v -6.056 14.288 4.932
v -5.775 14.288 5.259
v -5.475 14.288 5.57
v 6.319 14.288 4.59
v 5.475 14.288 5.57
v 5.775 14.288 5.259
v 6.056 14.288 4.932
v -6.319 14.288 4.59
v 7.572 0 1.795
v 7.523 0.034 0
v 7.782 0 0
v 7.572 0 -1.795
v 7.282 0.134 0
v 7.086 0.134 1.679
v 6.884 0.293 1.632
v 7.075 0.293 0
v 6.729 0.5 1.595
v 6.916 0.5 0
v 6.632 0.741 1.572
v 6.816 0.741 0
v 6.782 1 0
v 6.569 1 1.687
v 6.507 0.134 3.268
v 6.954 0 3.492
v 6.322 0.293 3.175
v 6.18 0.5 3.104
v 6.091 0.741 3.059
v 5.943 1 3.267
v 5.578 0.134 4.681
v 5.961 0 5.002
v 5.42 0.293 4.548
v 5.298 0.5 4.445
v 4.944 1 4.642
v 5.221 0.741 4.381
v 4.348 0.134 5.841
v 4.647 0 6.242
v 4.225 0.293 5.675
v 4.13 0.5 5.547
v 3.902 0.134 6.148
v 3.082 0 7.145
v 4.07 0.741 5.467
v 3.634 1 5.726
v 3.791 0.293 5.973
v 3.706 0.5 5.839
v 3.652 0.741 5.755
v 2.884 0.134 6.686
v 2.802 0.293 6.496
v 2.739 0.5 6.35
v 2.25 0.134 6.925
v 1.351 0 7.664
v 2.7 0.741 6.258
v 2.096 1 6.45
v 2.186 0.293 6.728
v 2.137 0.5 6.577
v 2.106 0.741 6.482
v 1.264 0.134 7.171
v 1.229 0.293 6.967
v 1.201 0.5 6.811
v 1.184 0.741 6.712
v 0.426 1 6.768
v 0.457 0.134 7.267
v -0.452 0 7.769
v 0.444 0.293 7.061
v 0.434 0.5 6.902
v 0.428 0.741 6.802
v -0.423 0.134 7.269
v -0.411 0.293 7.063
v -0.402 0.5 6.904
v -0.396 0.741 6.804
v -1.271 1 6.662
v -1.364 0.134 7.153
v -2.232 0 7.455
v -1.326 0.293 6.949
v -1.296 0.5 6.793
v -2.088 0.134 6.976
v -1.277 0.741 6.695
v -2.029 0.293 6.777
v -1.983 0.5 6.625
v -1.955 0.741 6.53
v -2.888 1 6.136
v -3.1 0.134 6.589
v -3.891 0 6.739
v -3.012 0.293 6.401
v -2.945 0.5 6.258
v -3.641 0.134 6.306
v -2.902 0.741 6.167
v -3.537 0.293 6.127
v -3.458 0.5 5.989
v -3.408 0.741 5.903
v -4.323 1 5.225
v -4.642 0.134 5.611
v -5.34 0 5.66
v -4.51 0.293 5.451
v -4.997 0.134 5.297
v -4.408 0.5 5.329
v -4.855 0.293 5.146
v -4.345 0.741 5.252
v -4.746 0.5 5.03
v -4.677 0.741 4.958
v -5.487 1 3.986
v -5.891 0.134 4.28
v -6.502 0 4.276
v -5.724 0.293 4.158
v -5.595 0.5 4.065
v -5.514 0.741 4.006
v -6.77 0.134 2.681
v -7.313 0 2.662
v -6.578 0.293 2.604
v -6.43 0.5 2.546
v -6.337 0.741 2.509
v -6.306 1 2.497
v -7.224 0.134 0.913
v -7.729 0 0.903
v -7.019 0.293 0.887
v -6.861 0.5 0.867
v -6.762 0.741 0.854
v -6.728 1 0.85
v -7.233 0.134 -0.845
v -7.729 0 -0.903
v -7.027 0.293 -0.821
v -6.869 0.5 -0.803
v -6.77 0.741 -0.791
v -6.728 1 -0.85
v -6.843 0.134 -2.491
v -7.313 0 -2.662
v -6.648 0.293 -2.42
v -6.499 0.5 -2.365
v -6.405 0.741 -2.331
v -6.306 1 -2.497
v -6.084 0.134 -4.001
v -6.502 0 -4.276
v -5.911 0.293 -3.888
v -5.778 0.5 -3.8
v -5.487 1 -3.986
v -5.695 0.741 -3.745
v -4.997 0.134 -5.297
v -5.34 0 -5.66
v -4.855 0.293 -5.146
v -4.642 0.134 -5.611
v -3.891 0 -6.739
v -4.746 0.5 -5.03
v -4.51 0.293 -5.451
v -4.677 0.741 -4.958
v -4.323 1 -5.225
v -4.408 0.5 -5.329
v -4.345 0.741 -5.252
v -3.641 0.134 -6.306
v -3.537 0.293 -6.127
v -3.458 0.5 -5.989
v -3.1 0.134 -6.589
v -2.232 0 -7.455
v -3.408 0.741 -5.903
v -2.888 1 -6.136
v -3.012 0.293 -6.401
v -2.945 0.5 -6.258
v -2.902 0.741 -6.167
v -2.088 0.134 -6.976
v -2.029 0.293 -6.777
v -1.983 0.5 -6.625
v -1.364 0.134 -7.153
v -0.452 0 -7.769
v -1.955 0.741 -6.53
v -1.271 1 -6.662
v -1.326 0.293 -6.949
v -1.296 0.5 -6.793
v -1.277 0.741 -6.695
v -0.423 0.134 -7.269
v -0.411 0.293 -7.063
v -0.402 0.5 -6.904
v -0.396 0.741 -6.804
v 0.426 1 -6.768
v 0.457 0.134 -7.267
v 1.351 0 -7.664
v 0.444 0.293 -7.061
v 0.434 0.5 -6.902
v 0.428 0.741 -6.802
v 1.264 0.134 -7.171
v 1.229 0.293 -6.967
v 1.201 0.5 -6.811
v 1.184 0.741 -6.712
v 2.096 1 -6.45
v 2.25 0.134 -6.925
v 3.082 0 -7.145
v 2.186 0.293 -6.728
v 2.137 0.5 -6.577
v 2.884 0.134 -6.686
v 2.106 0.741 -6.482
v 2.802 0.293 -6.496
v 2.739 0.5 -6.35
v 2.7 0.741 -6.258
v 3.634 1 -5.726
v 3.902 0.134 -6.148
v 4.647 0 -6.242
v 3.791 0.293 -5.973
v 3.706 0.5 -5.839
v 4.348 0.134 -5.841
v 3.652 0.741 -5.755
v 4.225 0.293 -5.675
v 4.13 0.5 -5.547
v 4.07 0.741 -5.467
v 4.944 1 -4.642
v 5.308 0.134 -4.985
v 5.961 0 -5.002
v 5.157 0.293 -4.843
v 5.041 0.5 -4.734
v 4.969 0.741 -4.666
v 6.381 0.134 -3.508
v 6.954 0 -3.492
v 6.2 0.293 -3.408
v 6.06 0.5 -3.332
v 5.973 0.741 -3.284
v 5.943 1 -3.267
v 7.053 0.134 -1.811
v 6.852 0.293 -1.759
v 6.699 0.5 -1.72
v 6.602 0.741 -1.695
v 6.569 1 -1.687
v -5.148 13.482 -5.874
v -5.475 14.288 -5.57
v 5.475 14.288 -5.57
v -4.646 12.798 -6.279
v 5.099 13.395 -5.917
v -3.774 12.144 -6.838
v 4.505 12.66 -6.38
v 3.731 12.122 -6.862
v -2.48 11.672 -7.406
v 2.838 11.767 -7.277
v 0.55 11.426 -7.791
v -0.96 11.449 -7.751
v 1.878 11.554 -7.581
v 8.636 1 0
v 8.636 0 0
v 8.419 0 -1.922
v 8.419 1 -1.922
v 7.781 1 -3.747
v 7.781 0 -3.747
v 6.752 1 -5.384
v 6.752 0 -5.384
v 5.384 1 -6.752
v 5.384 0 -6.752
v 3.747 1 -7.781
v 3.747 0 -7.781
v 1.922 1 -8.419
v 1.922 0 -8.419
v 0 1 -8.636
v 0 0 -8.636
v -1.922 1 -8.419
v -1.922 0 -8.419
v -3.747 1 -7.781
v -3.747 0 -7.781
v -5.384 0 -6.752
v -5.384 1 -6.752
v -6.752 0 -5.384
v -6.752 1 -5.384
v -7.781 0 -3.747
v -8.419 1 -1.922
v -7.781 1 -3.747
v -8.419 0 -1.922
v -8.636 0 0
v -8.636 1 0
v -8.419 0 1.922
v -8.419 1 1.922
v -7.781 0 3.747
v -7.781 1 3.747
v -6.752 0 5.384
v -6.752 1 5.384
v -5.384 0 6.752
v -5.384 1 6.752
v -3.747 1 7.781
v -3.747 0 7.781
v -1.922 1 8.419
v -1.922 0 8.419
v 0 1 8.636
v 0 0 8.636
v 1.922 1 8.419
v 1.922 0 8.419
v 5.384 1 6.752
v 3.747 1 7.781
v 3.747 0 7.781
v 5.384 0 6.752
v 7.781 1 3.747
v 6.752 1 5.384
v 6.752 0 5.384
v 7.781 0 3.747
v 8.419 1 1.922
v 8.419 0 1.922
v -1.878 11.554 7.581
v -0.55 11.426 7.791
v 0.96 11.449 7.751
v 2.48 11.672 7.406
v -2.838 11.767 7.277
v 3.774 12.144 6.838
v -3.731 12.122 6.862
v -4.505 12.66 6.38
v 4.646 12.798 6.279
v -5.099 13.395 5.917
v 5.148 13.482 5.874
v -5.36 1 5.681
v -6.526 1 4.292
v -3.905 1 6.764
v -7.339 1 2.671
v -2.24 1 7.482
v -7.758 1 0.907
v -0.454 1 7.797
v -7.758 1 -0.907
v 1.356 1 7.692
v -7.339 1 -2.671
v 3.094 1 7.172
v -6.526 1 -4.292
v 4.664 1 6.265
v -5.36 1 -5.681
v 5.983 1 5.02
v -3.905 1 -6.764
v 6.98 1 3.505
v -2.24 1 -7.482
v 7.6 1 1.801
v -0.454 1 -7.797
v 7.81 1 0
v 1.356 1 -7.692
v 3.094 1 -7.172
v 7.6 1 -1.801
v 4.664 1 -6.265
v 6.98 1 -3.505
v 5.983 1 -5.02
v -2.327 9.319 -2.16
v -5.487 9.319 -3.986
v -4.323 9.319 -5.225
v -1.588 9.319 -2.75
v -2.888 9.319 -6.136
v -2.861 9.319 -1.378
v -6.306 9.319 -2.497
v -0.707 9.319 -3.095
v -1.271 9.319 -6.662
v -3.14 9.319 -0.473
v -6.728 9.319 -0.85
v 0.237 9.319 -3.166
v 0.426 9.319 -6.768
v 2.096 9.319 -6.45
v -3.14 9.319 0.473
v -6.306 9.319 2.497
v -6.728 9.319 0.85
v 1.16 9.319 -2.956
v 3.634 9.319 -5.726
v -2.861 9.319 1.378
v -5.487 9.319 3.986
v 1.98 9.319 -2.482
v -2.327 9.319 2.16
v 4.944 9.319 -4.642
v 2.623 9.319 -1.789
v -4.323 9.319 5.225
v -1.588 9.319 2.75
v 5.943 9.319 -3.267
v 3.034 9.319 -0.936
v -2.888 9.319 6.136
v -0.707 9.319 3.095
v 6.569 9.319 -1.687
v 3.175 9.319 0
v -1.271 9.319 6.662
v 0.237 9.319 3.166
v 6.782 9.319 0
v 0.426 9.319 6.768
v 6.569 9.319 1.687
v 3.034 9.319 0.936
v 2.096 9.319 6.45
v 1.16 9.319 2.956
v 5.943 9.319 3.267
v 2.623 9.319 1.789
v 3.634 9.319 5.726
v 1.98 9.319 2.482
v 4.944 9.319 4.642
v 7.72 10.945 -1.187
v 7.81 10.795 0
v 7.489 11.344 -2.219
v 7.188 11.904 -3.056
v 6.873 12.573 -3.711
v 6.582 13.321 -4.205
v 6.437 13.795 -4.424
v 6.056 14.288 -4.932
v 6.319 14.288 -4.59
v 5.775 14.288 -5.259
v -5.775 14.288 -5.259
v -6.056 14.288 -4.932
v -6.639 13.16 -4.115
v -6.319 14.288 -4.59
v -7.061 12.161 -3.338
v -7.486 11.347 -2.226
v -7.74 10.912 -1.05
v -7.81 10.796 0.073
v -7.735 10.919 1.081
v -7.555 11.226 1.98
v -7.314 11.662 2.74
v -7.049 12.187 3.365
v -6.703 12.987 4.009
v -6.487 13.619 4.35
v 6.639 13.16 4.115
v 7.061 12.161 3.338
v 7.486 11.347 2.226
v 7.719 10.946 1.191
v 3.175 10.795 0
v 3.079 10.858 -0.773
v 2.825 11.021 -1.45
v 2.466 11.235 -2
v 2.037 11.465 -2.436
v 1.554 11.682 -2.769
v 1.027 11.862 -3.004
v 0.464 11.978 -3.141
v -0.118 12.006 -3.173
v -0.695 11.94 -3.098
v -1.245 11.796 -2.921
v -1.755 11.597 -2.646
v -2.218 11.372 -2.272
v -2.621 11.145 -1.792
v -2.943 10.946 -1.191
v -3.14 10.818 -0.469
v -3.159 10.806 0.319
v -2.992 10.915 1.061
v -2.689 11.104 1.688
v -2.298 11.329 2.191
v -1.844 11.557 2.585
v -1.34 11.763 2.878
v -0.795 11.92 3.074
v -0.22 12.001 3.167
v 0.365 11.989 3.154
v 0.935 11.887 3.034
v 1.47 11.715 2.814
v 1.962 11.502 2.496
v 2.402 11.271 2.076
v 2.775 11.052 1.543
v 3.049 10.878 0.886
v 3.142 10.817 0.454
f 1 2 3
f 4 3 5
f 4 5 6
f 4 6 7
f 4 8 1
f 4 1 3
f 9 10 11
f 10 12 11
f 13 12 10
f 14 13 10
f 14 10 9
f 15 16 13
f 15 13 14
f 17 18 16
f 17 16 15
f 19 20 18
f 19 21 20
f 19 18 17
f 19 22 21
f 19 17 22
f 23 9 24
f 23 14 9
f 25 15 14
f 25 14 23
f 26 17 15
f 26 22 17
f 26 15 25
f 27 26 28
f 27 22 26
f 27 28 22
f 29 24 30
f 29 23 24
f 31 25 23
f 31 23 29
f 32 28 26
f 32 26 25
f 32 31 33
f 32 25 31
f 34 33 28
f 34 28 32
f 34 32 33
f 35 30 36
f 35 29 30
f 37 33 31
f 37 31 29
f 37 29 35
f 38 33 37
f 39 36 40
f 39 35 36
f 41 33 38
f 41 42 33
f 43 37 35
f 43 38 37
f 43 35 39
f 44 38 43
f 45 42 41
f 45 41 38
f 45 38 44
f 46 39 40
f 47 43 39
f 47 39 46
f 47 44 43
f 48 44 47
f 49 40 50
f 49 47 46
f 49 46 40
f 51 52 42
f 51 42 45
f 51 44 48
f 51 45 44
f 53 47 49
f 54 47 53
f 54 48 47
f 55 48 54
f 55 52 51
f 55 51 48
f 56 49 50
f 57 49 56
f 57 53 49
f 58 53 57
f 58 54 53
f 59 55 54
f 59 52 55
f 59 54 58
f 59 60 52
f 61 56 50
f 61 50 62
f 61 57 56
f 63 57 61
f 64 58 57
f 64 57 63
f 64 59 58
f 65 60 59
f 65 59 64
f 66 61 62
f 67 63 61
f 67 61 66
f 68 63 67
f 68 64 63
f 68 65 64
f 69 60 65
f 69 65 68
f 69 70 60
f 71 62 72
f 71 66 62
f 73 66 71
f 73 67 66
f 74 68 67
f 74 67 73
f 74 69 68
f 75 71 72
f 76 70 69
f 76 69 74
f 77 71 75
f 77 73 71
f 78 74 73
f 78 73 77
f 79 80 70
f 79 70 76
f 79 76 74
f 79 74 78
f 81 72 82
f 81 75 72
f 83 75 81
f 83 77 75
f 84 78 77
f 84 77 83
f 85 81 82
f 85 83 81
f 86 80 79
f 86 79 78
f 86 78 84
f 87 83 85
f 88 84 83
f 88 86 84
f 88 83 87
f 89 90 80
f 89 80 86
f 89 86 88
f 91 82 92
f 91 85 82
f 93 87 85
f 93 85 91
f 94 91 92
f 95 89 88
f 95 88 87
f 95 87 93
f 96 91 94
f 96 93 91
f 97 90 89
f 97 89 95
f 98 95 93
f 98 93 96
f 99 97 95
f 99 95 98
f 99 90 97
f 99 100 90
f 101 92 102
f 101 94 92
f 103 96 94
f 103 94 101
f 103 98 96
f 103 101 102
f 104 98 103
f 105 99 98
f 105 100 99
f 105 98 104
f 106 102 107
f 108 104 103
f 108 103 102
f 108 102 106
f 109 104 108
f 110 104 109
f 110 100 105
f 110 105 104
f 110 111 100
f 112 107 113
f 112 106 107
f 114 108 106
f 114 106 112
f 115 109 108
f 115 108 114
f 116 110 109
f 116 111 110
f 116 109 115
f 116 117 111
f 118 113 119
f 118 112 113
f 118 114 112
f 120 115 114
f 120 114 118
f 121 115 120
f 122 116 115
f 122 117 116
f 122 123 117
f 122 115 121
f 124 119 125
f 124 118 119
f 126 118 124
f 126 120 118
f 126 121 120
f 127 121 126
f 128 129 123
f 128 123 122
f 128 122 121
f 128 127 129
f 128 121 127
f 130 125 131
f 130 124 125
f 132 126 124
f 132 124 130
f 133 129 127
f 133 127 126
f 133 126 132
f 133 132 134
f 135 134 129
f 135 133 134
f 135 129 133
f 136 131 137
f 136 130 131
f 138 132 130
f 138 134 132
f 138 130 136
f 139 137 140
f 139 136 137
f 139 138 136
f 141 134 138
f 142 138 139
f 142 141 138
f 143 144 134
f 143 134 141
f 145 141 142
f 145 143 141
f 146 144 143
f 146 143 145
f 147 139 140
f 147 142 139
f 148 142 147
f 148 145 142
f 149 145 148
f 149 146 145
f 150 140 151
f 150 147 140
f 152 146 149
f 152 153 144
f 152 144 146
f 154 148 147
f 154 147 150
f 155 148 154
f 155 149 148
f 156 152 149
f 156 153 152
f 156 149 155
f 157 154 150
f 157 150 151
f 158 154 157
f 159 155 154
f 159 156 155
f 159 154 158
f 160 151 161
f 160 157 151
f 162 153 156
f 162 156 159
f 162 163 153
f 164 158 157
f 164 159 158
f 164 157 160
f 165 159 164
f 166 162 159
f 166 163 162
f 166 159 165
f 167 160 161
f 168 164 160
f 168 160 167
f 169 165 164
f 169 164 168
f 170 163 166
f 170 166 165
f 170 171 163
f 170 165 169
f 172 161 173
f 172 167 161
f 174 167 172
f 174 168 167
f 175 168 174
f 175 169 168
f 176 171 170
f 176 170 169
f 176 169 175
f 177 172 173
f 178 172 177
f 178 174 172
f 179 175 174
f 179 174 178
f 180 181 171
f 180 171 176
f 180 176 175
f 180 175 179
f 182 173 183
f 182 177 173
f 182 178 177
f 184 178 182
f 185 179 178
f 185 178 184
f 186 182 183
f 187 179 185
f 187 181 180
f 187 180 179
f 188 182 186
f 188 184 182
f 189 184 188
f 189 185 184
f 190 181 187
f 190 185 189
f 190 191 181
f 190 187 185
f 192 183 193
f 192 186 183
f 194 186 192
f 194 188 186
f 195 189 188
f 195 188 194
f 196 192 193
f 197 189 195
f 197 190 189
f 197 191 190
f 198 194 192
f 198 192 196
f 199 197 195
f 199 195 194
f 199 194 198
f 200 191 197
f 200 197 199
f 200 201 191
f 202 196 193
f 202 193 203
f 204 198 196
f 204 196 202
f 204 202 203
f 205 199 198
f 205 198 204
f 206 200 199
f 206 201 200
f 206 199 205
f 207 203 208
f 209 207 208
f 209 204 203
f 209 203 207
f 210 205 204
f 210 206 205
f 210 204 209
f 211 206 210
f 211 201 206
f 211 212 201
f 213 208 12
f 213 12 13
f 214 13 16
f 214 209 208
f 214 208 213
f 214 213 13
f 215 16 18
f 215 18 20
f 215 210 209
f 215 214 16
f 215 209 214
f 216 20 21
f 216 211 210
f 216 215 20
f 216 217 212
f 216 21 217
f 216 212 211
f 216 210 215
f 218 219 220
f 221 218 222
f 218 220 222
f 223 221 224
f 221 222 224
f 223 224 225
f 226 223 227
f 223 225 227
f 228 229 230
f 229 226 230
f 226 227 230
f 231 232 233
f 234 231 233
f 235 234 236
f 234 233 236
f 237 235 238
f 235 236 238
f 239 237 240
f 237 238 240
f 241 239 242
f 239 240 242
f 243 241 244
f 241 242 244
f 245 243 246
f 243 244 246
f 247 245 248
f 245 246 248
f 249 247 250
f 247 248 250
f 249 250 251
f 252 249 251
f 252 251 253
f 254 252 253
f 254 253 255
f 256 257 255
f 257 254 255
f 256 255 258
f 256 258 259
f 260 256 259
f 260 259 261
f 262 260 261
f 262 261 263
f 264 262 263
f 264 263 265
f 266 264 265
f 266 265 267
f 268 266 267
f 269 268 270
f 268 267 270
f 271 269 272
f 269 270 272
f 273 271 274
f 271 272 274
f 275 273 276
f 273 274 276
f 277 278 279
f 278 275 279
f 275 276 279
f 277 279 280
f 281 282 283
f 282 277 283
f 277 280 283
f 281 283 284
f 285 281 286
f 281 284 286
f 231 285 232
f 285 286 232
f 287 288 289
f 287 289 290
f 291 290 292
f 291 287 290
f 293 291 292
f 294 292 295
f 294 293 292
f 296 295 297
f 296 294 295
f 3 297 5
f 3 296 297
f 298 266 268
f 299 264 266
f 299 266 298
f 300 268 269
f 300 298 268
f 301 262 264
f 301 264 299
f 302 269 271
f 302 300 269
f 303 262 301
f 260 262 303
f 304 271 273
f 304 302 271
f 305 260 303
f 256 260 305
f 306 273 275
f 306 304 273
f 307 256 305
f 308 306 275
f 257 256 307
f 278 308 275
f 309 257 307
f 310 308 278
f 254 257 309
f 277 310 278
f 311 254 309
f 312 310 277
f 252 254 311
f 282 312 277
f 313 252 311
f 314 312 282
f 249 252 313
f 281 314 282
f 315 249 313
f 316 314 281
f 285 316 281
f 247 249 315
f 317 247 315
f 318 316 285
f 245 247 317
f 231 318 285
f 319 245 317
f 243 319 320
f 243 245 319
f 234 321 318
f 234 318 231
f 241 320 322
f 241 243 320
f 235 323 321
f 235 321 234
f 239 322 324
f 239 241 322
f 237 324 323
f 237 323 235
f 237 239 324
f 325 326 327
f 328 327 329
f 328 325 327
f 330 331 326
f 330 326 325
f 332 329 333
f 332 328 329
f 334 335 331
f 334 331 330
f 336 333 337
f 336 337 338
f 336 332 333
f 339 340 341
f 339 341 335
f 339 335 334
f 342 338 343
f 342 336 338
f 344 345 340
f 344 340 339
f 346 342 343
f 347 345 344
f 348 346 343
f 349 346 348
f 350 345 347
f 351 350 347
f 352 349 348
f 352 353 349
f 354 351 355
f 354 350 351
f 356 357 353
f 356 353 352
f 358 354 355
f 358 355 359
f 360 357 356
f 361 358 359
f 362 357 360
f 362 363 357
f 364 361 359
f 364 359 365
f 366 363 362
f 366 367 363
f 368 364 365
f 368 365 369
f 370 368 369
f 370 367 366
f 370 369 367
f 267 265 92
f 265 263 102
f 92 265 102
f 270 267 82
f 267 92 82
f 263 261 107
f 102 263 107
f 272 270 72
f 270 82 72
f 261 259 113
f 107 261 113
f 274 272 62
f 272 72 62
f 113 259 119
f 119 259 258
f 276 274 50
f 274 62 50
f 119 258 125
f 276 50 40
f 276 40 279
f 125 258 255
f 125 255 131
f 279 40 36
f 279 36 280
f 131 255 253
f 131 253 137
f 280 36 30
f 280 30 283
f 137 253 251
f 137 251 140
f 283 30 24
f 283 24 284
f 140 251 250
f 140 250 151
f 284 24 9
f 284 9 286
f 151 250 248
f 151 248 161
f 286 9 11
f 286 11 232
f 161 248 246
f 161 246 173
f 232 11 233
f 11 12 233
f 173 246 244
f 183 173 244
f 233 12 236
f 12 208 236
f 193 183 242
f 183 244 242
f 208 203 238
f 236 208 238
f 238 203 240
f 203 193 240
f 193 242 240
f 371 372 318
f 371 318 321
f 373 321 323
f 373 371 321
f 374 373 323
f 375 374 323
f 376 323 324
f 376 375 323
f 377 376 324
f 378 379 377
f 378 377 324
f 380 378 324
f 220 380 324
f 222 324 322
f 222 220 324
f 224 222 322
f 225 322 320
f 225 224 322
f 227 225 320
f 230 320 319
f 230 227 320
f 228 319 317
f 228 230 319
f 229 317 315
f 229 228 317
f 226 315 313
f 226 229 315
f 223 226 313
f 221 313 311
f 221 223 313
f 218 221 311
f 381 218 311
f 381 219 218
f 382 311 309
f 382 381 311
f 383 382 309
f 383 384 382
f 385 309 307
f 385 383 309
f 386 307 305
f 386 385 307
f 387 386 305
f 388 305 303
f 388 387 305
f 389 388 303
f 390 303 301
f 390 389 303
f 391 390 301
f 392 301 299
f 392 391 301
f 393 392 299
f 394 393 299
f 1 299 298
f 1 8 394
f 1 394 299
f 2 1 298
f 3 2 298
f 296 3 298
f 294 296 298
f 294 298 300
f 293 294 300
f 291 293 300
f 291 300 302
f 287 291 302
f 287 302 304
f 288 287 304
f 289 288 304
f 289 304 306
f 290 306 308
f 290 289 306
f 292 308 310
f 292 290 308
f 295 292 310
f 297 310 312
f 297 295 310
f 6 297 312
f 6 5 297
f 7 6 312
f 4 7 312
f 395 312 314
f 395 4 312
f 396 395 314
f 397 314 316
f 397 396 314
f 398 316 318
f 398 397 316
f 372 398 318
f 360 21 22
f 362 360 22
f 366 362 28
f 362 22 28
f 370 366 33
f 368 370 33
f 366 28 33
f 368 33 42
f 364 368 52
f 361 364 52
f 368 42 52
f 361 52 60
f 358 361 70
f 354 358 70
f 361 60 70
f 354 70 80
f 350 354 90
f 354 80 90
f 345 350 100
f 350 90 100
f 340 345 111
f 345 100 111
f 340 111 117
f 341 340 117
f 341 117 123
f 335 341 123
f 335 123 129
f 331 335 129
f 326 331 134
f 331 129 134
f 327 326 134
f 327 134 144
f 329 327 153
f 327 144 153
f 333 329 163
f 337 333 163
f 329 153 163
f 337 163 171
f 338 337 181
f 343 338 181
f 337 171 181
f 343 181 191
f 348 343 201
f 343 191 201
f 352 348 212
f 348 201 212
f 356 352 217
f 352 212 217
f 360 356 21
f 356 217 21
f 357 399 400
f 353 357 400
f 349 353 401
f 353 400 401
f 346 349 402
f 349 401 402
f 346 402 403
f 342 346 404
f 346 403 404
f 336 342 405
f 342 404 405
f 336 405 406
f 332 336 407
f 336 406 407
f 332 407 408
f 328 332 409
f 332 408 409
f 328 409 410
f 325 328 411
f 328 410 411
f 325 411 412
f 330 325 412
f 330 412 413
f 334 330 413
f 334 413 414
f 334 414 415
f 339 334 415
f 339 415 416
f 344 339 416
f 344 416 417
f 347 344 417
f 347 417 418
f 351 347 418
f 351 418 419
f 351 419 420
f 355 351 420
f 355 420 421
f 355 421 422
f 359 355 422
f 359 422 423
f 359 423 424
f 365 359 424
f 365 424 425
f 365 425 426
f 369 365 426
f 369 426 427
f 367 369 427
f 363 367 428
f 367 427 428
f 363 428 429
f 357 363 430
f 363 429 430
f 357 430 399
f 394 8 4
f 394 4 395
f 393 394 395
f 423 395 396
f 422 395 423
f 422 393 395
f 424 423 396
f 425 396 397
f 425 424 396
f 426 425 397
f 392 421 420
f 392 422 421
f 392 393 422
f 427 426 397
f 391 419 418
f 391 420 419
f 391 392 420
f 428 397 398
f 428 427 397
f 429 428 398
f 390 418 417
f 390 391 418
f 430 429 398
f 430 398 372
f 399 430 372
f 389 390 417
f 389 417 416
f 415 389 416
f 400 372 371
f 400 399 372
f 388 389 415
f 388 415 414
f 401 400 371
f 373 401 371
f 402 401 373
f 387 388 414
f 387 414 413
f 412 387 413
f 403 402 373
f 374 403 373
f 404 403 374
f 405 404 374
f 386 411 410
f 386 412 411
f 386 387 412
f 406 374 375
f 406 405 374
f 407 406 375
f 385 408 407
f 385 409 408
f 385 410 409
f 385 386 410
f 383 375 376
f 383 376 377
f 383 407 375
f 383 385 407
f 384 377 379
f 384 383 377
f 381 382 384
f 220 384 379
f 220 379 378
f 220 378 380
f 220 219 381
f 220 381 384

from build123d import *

# Parameters (mm, degrees)
SKETCH1_R               = 8.636
BOSS_EXTRUDE1_DEPTH     = 14.2875
SKETCH5_R               = 4.7625
CUT_EXTRUDE4_DEPTH      = 9.636
CUT_EXTRUDE4_DEPTH_BACK = 9.636
SKETCH2_OUTSIDE_W       = 24.932
SKETCH2_OUTSIDE_H       = 24.932
SKETCH2_OUTSIDE_R       = 7.8105
CUT_EXTRUDE1_DEPTH      = 13.2875
SKETCH4_R               = 3.175
CUT_EXTRUDE3_DEPTH      = 15.2875
SKETCH3_R               = 6.7818
CUT_EXTRUDE2_DEPTH      = 9.31875
FILLET1_R               = 1


with BuildPart() as part:
    # Sketch1 → Boss-Extrude1 (new body)
    with BuildSketch(Plane(origin=(0, 0, 0), x_dir=(1, 0, 0), z_dir=(0, 1, 0))):
        Circle(SKETCH1_R)
    extrude(amount=BOSS_EXTRUDE1_DEPTH)

    # Sketch5 → Cut-Extrude4 (cut, two sides)
    with BuildSketch(Plane(origin=(0, 0, 0), x_dir=(0, 0, -1), z_dir=(1, 0, 0))) as cut_extrude4_sk:
        with Locations((0, 15.5575)):
            Circle(SKETCH5_R)
        with Locations((-10.16, 15.5575)):
            Circle(SKETCH5_R)
        with Locations((10.16, 15.5575)):
            Circle(SKETCH5_R)
    extrude(amount=CUT_EXTRUDE4_DEPTH, mode=Mode.SUBTRACT)
    extrude(cut_extrude4_sk.sketch, amount=-CUT_EXTRUDE4_DEPTH_BACK, mode=Mode.SUBTRACT)

    # Sketch2 outside → Cut-Extrude1 (cut)
    with BuildSketch(Plane(origin=(0, 14.2875, 0), x_dir=(1, 0, 0), z_dir=(0, 1, 0))):
        Rectangle(SKETCH2_OUTSIDE_W, SKETCH2_OUTSIDE_H)
        Circle(SKETCH2_OUTSIDE_R, mode=Mode.SUBTRACT)
    extrude(amount=-CUT_EXTRUDE1_DEPTH, mode=Mode.SUBTRACT)

    # Sketch4 → Cut-Extrude3 (cut, through all)
    with BuildSketch(Plane(origin=(0, 14.2875, 0), x_dir=(1, 0, 0), z_dir=(0, 1, 0))):
        Circle(SKETCH4_R)
    extrude(amount=-CUT_EXTRUDE3_DEPTH, mode=Mode.SUBTRACT)

    # Sketch3 → Cut-Extrude2 (cut)
    with BuildSketch(Plane.XZ):
        Circle(SKETCH3_R)
    extrude(amount=-CUT_EXTRUDE2_DEPTH, mode=Mode.SUBTRACT)

    # Fillet1
    fillet1_edges = [part.edges().sort_by_distance(p)[0] for p in [
        (-6.7818, 0, 0),
    ]]
    fillet(fillet1_edges, radius=FILLET1_R)


solid = part.part
